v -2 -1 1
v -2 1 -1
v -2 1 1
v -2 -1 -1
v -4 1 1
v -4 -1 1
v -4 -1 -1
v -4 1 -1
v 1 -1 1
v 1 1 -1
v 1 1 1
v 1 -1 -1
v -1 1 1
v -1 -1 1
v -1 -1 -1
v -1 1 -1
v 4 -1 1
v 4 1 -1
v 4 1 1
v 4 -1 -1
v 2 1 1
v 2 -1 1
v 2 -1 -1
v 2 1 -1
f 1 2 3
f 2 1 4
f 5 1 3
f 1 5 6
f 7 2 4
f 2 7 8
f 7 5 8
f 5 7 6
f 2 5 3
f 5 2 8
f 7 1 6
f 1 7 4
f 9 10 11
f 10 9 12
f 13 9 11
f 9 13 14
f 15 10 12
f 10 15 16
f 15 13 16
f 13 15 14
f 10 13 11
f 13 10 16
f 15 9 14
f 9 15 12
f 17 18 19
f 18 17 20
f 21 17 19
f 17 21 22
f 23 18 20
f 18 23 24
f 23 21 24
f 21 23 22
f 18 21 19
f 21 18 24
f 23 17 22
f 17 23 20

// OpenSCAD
// mirror_copy(d=[6, 10, 15]) cube([5,5,5], center=true);
module mirror_copy(axis, d) {
	if (is_undef(axis)) mirror_copy(axis=d, d=d) children();
	else if (is_num(axis)) mirror_copy(axis=[axis?1:0,0], d=d) children();
	else if (axis.z) mirrorZ_copy(d) mirror_copy(axis=[axis.x, axis.y, 0], d=d) children();
	else if (axis.y) mirrorY_copy(d) mirror_copy(axis=[axis.x, 0, 0], d=d) children();
	else if (axis.x) mirrorX_copy(d) children();
	else children();
}
module mirrorX_copy(d) {
	if (is_num(d)) mirrorX_copy() translate([d/2,0,0]) children();
	else if (is_num(d.x)) mirrorX_copy() translate([d.x/2,0,0]) children();
	else {
		mirror([1,0,0]) children();
		children();
	}
}
module mirrorY_copy(d) {
	if (is_num(d)) mirrorY_copy() translate([0,d/2,0]) children();
	else if (is_num(d.y)) mirrorY_copy() translate([0,d.y/2,0]) children();
	else {
		mirror([0,1,0]) children();
		children();
	}
}
module mirrorZ_copy(d) {
	if (is_num(d)) mirrorZ_copy() translate([0,0,d/2]) children();
	else if (is_num(d.z)) mirrorZ_copy() translate([0,0,d.z/2]) children();
	else {
		mirror([0,0,1]) children();
		children();
	}
}
module translate_copy(v, n=2) {
	if (is_num(v)) translate_copy([v,0,0]) children();
	else if (v.z) translate_copy([v.x,v.y,0]) translate([1,0,0]) children();
	else if (v.x) translate_copy([0,0,0]) translate([1,0,0]) children();
	// else if (is_num(v.y)) translate_copy([0,v.y,0]) children();
	// else if (is_num(v.z)) translate_copy([0,0,v.z]) children();
	else {
		children();
	}
}
module translateX_copy(d,n=2, center=true) {
	translate([-d*(n-1)/2,0,0]*(center?1:0))
	for (i = [0:n-1])
		translate([d,0,0] * i) children();
}
module translateY_copy(d,n=2, center=true) {
	translate([0,-d*(n-1)/2,0]*(center?1:0))
	for (i = [0:n-1])
		translate([0,d,0] * i) children();
}
module translateZ_copy(d,n=2, center=true) {
	translate([0,0,-d*(n-1)/2]*(center?1:0))
	for (i = [0:n-1])
		translate([0,0,d] * i) children();
}
translateX_copy(3,3)
	cube([2,2,2], center=true);
